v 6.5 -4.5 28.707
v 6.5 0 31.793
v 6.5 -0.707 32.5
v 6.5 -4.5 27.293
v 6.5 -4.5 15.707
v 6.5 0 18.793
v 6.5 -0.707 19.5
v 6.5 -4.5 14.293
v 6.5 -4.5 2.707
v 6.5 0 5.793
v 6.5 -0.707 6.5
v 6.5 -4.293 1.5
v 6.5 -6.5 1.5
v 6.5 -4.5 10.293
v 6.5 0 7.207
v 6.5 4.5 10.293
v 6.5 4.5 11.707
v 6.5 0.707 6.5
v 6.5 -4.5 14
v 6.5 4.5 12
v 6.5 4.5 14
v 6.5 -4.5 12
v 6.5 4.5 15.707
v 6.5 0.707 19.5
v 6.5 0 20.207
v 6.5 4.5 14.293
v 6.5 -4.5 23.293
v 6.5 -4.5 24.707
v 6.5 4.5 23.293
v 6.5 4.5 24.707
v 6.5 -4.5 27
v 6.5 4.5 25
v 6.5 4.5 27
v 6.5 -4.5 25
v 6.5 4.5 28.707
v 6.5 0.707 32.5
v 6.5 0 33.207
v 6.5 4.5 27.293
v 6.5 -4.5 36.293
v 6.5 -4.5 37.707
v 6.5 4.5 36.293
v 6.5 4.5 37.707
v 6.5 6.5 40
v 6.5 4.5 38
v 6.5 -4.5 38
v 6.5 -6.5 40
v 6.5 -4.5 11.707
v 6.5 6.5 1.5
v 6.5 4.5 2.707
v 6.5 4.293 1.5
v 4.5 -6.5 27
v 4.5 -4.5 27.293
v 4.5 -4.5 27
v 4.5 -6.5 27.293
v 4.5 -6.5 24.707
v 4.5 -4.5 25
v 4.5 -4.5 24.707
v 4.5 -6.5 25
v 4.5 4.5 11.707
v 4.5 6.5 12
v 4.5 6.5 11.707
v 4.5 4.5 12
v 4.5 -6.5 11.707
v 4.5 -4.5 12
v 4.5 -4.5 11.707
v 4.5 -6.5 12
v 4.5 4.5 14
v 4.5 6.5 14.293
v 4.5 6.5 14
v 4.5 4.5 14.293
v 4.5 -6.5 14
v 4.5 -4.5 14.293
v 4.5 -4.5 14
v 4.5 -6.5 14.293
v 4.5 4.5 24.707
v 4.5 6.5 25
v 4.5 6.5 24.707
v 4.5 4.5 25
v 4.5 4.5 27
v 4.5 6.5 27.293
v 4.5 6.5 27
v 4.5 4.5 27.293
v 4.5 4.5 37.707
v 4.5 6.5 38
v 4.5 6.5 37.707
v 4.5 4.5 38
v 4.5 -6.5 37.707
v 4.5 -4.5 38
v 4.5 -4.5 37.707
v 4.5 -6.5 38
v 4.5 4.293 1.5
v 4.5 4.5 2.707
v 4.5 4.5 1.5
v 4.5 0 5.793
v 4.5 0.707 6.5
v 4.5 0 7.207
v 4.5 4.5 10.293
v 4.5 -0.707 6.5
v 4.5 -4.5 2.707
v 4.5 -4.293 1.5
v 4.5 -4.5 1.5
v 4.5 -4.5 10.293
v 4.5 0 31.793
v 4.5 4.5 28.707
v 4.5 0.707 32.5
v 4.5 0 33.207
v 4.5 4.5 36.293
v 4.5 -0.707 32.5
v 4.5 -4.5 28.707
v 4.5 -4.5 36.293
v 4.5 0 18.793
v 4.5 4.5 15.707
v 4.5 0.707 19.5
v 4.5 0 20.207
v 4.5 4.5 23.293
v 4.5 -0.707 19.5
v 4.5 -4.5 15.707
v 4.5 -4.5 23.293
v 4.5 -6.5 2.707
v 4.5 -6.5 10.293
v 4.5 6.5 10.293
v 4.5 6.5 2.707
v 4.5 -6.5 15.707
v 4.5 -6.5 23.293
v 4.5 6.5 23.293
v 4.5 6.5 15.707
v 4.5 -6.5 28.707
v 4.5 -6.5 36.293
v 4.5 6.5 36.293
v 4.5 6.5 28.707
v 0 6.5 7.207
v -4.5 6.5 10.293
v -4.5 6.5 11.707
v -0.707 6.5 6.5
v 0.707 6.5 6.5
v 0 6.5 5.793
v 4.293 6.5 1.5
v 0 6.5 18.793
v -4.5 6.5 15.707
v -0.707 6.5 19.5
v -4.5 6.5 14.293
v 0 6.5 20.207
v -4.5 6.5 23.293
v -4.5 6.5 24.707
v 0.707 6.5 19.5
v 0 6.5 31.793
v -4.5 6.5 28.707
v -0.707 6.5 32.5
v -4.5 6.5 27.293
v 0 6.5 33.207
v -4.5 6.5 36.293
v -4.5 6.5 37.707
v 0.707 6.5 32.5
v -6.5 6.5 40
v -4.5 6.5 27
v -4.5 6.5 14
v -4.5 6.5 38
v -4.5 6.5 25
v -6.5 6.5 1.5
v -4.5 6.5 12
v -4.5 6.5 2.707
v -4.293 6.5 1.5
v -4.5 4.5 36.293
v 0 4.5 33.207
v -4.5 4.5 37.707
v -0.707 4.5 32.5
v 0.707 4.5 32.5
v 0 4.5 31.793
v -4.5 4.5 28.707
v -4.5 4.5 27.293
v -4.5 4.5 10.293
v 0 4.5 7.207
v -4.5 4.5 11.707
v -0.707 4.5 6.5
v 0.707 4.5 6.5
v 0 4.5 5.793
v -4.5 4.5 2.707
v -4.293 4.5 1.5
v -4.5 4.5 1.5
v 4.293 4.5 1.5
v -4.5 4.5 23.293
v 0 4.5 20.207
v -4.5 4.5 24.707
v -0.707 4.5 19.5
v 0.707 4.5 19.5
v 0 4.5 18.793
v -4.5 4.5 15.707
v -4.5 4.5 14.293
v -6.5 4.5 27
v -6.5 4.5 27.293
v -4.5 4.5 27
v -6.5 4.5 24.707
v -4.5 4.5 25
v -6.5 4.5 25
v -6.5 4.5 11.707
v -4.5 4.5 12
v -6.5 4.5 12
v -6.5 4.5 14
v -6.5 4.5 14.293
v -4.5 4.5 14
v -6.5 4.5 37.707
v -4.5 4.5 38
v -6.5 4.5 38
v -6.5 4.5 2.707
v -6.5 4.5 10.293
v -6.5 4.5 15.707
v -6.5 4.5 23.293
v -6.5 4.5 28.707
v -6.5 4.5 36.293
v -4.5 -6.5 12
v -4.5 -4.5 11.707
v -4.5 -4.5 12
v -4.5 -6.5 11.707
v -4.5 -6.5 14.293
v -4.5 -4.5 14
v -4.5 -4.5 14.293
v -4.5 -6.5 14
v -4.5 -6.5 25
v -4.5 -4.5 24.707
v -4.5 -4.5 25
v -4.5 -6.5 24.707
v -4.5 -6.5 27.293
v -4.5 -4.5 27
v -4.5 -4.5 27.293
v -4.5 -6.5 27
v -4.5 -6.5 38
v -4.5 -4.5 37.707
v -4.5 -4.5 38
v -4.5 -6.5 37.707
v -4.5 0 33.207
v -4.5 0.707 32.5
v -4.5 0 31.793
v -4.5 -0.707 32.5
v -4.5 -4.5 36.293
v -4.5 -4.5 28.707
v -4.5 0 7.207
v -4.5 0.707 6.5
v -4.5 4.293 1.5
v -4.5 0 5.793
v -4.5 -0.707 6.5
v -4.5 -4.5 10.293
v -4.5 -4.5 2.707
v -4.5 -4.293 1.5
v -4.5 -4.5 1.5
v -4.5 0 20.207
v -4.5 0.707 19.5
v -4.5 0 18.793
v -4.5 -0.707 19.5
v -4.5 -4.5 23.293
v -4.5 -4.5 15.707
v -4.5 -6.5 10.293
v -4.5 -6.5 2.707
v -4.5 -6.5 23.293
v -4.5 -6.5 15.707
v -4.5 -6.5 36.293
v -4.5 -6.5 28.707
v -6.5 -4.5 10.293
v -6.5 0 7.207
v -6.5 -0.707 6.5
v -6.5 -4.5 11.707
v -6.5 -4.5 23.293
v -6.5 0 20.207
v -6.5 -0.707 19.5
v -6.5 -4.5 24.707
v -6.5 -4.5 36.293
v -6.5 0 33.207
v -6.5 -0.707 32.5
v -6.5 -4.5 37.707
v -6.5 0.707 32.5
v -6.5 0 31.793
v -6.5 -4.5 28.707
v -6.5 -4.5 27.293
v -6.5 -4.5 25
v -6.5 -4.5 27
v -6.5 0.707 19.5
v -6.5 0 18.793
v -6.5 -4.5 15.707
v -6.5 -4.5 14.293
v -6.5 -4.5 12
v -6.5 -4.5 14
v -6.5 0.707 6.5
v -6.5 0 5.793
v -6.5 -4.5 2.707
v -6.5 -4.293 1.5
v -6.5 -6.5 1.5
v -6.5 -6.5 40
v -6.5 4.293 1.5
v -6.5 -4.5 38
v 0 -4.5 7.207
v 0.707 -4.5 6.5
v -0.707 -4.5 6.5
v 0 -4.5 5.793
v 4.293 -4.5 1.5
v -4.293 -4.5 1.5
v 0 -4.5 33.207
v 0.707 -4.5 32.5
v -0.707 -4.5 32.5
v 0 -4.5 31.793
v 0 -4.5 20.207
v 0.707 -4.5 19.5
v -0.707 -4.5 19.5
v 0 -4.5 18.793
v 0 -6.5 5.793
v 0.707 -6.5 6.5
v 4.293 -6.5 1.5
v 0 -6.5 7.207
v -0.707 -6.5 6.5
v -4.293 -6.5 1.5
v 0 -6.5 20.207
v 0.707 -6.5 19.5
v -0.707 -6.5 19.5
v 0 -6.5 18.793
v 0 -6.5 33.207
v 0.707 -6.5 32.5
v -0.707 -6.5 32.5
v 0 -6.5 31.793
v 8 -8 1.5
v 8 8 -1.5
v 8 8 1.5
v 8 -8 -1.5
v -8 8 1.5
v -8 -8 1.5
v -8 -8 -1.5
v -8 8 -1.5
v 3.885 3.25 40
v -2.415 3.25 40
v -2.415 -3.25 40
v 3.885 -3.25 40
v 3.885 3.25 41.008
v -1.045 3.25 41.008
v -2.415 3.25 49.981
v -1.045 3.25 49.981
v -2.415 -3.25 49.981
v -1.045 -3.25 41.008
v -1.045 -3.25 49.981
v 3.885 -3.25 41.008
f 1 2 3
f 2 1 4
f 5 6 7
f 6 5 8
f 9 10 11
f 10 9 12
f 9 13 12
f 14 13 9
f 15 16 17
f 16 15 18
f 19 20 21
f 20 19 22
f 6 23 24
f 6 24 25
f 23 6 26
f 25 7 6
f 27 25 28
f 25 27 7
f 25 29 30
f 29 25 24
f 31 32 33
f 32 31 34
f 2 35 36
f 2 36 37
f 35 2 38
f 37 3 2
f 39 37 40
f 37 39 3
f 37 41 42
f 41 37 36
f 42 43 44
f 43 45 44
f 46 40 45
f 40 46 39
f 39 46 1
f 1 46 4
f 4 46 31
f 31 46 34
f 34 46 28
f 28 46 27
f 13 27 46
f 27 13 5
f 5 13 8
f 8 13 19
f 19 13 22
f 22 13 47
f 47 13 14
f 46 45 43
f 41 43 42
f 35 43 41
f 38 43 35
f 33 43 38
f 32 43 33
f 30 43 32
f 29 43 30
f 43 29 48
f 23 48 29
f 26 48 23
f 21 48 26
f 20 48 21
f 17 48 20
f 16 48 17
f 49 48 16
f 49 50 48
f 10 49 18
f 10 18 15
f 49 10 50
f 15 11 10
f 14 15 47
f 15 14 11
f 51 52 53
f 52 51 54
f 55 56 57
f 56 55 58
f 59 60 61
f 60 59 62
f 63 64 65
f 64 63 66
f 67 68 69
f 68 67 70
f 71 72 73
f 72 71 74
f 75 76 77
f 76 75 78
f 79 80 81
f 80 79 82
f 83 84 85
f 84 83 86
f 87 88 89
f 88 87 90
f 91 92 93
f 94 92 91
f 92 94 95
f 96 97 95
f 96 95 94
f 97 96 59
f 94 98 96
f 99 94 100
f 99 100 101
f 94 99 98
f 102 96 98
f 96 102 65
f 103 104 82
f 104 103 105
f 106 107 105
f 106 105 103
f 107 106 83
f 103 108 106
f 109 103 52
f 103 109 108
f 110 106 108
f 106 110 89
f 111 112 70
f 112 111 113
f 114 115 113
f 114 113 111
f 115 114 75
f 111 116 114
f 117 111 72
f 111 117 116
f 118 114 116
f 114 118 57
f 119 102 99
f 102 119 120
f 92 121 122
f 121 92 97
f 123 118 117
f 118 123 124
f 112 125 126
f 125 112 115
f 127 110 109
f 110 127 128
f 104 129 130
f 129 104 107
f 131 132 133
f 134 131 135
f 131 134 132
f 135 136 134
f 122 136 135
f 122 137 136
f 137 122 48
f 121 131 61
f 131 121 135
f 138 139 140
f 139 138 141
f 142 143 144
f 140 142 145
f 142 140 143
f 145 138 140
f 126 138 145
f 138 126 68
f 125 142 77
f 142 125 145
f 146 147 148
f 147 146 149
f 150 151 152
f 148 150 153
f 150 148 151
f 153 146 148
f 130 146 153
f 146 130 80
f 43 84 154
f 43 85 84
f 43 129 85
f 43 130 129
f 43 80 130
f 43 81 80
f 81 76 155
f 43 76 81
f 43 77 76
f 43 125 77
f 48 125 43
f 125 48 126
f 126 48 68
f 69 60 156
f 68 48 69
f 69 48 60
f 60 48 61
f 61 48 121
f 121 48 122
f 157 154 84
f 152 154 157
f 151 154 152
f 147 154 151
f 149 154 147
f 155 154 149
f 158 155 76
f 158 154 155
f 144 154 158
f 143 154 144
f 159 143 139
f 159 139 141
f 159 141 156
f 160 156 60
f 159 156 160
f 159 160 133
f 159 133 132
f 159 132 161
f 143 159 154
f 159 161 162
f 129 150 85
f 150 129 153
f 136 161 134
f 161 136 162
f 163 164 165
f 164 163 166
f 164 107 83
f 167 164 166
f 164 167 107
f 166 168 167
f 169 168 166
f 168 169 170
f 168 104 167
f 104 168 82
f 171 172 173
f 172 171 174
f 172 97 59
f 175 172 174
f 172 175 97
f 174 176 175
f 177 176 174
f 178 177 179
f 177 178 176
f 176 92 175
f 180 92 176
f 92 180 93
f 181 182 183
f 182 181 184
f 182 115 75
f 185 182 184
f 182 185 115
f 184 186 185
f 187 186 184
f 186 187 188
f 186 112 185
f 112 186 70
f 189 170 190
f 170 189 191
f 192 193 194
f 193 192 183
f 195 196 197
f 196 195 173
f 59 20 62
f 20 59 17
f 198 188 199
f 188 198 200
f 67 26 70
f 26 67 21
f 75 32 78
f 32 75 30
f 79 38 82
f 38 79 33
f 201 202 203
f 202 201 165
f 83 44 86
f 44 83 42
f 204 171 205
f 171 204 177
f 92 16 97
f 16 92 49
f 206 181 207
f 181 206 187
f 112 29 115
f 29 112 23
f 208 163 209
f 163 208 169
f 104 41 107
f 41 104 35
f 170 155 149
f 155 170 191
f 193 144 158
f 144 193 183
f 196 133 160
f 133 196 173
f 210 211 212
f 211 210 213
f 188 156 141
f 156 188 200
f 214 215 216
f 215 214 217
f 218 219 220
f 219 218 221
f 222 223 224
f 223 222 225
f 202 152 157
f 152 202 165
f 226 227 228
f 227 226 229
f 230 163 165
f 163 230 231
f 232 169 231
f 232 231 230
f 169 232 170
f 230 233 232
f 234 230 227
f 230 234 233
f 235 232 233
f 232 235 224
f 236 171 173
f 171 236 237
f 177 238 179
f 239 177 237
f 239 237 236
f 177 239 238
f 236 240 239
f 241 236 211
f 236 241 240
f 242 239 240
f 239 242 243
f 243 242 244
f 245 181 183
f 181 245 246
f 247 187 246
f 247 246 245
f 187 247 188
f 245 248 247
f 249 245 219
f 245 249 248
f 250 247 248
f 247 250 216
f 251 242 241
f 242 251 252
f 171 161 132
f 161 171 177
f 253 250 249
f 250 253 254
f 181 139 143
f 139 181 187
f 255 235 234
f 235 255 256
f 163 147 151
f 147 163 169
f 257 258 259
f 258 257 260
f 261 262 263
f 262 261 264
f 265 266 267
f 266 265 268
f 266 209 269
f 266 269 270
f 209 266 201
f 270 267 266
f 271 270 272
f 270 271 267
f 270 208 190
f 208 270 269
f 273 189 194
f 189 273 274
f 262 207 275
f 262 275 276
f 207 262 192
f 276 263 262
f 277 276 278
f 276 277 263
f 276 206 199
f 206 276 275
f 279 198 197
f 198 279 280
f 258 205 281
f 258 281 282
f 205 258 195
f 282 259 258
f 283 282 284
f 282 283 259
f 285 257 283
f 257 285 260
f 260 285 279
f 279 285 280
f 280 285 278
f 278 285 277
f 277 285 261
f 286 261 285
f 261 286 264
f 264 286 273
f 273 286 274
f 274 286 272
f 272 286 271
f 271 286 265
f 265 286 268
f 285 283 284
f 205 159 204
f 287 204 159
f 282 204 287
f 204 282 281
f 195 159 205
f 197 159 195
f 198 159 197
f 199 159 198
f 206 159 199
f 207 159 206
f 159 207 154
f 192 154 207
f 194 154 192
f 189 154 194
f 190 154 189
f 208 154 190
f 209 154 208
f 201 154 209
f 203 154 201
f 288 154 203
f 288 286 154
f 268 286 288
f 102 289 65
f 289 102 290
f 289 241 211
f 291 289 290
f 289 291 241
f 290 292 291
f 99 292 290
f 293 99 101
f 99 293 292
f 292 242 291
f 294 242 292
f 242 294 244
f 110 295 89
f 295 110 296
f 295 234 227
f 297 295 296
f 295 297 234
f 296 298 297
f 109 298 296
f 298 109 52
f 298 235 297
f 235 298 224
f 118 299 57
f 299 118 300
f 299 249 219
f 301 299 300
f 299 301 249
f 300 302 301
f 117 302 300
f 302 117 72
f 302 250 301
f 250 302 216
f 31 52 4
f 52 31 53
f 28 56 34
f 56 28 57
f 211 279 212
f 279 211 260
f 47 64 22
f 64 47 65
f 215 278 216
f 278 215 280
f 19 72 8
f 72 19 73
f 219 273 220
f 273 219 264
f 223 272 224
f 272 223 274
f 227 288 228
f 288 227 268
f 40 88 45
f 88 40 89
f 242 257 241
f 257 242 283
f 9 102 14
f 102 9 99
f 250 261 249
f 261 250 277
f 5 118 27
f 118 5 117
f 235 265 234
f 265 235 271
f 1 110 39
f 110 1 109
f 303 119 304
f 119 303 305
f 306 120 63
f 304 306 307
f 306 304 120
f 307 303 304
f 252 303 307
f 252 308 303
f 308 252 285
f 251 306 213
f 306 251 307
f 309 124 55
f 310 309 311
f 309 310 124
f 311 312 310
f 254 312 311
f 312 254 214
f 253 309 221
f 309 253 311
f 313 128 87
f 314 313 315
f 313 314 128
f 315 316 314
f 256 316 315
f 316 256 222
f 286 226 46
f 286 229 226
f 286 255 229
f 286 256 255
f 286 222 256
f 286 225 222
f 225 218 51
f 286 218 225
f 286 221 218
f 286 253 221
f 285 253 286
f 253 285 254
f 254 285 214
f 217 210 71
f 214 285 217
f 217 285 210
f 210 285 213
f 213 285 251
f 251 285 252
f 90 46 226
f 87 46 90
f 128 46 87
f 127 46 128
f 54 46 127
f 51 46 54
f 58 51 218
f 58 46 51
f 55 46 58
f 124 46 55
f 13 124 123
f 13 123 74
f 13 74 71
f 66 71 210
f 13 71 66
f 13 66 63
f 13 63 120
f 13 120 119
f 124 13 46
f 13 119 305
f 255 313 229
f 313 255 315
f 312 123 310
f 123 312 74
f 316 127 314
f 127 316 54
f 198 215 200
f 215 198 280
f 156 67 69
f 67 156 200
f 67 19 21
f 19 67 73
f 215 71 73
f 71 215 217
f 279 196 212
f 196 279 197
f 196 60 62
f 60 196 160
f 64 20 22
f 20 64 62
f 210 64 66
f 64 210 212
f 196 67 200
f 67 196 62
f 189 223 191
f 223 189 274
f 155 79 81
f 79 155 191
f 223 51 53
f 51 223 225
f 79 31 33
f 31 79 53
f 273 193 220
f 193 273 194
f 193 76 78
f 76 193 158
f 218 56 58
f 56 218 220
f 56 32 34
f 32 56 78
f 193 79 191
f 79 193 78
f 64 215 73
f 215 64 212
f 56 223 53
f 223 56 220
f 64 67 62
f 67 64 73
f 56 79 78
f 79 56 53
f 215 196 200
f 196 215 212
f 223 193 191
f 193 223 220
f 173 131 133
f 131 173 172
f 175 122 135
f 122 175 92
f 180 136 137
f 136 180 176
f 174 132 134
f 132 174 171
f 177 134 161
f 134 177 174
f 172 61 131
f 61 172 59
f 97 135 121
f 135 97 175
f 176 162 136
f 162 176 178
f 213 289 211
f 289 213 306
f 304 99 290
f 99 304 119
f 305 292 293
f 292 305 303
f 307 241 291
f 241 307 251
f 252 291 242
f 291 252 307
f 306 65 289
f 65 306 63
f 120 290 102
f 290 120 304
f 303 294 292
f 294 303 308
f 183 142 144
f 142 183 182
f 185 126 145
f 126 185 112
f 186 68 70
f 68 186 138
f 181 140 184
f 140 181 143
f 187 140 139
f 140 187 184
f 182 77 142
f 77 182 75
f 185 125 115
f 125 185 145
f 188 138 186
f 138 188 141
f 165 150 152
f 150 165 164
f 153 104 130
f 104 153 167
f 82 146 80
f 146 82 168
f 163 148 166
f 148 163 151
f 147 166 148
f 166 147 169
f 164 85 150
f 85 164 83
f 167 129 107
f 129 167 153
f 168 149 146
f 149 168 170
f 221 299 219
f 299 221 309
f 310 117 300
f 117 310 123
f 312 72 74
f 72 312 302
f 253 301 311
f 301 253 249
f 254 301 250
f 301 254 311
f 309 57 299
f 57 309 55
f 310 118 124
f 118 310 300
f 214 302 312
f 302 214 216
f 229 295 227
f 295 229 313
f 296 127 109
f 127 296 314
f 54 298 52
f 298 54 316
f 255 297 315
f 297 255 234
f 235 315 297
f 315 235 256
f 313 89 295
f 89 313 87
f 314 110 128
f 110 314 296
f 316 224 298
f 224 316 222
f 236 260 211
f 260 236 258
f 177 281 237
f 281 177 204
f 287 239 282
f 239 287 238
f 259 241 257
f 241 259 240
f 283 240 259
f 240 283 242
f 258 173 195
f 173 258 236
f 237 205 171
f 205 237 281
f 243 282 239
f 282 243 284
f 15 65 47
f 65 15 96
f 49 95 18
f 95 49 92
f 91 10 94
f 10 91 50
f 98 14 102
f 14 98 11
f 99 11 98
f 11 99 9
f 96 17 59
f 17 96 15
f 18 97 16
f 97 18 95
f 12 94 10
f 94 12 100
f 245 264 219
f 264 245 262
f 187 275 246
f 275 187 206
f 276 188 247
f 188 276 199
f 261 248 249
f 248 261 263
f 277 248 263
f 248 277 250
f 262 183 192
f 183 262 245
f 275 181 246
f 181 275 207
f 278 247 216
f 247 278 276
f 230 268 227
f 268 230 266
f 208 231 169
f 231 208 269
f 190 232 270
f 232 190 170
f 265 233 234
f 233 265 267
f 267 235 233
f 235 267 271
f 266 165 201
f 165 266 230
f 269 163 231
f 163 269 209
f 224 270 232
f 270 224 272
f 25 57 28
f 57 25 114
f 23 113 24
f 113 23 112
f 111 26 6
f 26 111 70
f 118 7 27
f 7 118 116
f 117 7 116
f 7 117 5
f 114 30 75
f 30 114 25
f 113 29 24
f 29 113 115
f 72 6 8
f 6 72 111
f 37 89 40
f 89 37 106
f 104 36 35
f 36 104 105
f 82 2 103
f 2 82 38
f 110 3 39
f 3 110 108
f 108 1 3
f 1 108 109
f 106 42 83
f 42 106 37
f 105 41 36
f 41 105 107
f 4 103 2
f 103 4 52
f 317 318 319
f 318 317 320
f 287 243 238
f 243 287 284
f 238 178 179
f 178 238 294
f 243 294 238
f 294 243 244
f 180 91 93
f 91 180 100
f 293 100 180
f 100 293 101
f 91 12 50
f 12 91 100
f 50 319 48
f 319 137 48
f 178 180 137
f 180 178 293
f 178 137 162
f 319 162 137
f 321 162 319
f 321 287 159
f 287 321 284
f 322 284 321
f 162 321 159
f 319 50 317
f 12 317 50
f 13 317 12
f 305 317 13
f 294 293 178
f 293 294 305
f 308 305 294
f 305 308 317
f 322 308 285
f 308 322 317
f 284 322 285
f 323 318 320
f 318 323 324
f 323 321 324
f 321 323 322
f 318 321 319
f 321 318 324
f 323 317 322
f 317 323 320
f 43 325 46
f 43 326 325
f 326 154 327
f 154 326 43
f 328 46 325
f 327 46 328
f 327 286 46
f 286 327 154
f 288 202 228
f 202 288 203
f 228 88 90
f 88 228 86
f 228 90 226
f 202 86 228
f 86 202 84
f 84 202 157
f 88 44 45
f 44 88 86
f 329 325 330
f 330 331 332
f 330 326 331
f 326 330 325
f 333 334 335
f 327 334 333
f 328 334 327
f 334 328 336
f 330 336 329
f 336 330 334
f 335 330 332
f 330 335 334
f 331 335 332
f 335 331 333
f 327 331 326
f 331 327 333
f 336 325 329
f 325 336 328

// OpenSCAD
topLabel = "L";
towerBaseX = 16;
towerBaseY = 16;
towerBaseZ = 3;
towerX = 13;
towerY = 13;
towerZ = 39;
towerPosts = 2;
postOffset = (towerX/2)-towerPosts/2;
segZ = ((towerZ)/3);
echo(segZ);
fontHeight = 10;


cube([towerBaseX, towerBaseY, towerBaseZ], center=true);

translate([0,0,towerZ]) {
    cube([towerX, towerY, towerPosts], center=true);
}

towerLegs();
towerHorizontal();
towerCrosses();
rotate(90) towerCrosses();
translate([0,towerY/4,(towerPosts/2+towerZ+fontHeight/2)-.2]) topText(topLabel);

module topText(label) {
    rotate([90,0,0]) {
        linear_extrude(height = towerX/2) {
            text(label, size=fontHeight, font="Arial Black:Style=bold", halign="center", valign="center");
        }
    }
}

module towerCrosses() {
    translate([0,postOffset,segZ/2]) towerCross();
    translate([0,-postOffset,segZ/2]) towerCross();
    translate([0,postOffset,(segZ/2)*3]) towerCross();
    translate([0,postOffset,(segZ/2)*5]) towerCross();
    translate([0,-postOffset,(segZ/2)*3]) towerCross();
    translate([0,-postOffset,(segZ/2)*5]) towerCross();
}

module towerCross() {
    rotate([0,45,0]) {
        cube([towerX+1.5, towerPosts, towerPosts/2], center=true);
    }
    rotate([0,-45,0]) {
        cube([towerX+1.5, towerPosts, towerPosts/2], center=true);
    }
}



module towerLegs() {
    translate([postOffset, postOffset,towerZ/2]) {
        cube([towerPosts, towerPosts, towerZ], center=true);
    }
    translate([-postOffset, -postOffset,towerZ/2]) {
        cube([towerPosts, towerPosts, towerZ], center=true);
    }
    translate([-postOffset, postOffset,towerZ/2]) {
        cube([towerPosts, towerPosts, towerZ], center=true);
    }
    translate([postOffset, -postOffset,towerZ/2]) {
        cube([towerPosts, towerPosts, towerZ], center=true);
    }
}

module towerHorizontal() {
        
    translate([0,postOffset,segZ]) {
        cube([towerX, towerPosts, towerPosts], center=true);
    }
    translate([0,postOffset,segZ*2]) {
        cube([towerX, towerPosts, towerPosts], center=true);
    }

    translate([0,-postOffset,segZ]) {
        cube([towerX, towerPosts, towerPosts], center=true);
    }
    translate([0,-postOffset,segZ*2]) {
        cube([towerX, towerPosts, towerPosts], center=true);
    }

    translate([postOffset, 0,segZ]) {
        cube([towerPosts, towerY, towerPosts], center=true);
    }
    translate([postOffset, 0,segZ*2]) {
        cube([towerPosts, towerY, towerPosts], center=true);
    }

    translate([-postOffset, 0,segZ]) {
        cube([towerPosts, towerY, towerPosts], center=true);
    }
    translate([-postOffset, 0,segZ*2]) {
        cube([towerPosts, towerY, towerPosts], center=true);
    }
}
